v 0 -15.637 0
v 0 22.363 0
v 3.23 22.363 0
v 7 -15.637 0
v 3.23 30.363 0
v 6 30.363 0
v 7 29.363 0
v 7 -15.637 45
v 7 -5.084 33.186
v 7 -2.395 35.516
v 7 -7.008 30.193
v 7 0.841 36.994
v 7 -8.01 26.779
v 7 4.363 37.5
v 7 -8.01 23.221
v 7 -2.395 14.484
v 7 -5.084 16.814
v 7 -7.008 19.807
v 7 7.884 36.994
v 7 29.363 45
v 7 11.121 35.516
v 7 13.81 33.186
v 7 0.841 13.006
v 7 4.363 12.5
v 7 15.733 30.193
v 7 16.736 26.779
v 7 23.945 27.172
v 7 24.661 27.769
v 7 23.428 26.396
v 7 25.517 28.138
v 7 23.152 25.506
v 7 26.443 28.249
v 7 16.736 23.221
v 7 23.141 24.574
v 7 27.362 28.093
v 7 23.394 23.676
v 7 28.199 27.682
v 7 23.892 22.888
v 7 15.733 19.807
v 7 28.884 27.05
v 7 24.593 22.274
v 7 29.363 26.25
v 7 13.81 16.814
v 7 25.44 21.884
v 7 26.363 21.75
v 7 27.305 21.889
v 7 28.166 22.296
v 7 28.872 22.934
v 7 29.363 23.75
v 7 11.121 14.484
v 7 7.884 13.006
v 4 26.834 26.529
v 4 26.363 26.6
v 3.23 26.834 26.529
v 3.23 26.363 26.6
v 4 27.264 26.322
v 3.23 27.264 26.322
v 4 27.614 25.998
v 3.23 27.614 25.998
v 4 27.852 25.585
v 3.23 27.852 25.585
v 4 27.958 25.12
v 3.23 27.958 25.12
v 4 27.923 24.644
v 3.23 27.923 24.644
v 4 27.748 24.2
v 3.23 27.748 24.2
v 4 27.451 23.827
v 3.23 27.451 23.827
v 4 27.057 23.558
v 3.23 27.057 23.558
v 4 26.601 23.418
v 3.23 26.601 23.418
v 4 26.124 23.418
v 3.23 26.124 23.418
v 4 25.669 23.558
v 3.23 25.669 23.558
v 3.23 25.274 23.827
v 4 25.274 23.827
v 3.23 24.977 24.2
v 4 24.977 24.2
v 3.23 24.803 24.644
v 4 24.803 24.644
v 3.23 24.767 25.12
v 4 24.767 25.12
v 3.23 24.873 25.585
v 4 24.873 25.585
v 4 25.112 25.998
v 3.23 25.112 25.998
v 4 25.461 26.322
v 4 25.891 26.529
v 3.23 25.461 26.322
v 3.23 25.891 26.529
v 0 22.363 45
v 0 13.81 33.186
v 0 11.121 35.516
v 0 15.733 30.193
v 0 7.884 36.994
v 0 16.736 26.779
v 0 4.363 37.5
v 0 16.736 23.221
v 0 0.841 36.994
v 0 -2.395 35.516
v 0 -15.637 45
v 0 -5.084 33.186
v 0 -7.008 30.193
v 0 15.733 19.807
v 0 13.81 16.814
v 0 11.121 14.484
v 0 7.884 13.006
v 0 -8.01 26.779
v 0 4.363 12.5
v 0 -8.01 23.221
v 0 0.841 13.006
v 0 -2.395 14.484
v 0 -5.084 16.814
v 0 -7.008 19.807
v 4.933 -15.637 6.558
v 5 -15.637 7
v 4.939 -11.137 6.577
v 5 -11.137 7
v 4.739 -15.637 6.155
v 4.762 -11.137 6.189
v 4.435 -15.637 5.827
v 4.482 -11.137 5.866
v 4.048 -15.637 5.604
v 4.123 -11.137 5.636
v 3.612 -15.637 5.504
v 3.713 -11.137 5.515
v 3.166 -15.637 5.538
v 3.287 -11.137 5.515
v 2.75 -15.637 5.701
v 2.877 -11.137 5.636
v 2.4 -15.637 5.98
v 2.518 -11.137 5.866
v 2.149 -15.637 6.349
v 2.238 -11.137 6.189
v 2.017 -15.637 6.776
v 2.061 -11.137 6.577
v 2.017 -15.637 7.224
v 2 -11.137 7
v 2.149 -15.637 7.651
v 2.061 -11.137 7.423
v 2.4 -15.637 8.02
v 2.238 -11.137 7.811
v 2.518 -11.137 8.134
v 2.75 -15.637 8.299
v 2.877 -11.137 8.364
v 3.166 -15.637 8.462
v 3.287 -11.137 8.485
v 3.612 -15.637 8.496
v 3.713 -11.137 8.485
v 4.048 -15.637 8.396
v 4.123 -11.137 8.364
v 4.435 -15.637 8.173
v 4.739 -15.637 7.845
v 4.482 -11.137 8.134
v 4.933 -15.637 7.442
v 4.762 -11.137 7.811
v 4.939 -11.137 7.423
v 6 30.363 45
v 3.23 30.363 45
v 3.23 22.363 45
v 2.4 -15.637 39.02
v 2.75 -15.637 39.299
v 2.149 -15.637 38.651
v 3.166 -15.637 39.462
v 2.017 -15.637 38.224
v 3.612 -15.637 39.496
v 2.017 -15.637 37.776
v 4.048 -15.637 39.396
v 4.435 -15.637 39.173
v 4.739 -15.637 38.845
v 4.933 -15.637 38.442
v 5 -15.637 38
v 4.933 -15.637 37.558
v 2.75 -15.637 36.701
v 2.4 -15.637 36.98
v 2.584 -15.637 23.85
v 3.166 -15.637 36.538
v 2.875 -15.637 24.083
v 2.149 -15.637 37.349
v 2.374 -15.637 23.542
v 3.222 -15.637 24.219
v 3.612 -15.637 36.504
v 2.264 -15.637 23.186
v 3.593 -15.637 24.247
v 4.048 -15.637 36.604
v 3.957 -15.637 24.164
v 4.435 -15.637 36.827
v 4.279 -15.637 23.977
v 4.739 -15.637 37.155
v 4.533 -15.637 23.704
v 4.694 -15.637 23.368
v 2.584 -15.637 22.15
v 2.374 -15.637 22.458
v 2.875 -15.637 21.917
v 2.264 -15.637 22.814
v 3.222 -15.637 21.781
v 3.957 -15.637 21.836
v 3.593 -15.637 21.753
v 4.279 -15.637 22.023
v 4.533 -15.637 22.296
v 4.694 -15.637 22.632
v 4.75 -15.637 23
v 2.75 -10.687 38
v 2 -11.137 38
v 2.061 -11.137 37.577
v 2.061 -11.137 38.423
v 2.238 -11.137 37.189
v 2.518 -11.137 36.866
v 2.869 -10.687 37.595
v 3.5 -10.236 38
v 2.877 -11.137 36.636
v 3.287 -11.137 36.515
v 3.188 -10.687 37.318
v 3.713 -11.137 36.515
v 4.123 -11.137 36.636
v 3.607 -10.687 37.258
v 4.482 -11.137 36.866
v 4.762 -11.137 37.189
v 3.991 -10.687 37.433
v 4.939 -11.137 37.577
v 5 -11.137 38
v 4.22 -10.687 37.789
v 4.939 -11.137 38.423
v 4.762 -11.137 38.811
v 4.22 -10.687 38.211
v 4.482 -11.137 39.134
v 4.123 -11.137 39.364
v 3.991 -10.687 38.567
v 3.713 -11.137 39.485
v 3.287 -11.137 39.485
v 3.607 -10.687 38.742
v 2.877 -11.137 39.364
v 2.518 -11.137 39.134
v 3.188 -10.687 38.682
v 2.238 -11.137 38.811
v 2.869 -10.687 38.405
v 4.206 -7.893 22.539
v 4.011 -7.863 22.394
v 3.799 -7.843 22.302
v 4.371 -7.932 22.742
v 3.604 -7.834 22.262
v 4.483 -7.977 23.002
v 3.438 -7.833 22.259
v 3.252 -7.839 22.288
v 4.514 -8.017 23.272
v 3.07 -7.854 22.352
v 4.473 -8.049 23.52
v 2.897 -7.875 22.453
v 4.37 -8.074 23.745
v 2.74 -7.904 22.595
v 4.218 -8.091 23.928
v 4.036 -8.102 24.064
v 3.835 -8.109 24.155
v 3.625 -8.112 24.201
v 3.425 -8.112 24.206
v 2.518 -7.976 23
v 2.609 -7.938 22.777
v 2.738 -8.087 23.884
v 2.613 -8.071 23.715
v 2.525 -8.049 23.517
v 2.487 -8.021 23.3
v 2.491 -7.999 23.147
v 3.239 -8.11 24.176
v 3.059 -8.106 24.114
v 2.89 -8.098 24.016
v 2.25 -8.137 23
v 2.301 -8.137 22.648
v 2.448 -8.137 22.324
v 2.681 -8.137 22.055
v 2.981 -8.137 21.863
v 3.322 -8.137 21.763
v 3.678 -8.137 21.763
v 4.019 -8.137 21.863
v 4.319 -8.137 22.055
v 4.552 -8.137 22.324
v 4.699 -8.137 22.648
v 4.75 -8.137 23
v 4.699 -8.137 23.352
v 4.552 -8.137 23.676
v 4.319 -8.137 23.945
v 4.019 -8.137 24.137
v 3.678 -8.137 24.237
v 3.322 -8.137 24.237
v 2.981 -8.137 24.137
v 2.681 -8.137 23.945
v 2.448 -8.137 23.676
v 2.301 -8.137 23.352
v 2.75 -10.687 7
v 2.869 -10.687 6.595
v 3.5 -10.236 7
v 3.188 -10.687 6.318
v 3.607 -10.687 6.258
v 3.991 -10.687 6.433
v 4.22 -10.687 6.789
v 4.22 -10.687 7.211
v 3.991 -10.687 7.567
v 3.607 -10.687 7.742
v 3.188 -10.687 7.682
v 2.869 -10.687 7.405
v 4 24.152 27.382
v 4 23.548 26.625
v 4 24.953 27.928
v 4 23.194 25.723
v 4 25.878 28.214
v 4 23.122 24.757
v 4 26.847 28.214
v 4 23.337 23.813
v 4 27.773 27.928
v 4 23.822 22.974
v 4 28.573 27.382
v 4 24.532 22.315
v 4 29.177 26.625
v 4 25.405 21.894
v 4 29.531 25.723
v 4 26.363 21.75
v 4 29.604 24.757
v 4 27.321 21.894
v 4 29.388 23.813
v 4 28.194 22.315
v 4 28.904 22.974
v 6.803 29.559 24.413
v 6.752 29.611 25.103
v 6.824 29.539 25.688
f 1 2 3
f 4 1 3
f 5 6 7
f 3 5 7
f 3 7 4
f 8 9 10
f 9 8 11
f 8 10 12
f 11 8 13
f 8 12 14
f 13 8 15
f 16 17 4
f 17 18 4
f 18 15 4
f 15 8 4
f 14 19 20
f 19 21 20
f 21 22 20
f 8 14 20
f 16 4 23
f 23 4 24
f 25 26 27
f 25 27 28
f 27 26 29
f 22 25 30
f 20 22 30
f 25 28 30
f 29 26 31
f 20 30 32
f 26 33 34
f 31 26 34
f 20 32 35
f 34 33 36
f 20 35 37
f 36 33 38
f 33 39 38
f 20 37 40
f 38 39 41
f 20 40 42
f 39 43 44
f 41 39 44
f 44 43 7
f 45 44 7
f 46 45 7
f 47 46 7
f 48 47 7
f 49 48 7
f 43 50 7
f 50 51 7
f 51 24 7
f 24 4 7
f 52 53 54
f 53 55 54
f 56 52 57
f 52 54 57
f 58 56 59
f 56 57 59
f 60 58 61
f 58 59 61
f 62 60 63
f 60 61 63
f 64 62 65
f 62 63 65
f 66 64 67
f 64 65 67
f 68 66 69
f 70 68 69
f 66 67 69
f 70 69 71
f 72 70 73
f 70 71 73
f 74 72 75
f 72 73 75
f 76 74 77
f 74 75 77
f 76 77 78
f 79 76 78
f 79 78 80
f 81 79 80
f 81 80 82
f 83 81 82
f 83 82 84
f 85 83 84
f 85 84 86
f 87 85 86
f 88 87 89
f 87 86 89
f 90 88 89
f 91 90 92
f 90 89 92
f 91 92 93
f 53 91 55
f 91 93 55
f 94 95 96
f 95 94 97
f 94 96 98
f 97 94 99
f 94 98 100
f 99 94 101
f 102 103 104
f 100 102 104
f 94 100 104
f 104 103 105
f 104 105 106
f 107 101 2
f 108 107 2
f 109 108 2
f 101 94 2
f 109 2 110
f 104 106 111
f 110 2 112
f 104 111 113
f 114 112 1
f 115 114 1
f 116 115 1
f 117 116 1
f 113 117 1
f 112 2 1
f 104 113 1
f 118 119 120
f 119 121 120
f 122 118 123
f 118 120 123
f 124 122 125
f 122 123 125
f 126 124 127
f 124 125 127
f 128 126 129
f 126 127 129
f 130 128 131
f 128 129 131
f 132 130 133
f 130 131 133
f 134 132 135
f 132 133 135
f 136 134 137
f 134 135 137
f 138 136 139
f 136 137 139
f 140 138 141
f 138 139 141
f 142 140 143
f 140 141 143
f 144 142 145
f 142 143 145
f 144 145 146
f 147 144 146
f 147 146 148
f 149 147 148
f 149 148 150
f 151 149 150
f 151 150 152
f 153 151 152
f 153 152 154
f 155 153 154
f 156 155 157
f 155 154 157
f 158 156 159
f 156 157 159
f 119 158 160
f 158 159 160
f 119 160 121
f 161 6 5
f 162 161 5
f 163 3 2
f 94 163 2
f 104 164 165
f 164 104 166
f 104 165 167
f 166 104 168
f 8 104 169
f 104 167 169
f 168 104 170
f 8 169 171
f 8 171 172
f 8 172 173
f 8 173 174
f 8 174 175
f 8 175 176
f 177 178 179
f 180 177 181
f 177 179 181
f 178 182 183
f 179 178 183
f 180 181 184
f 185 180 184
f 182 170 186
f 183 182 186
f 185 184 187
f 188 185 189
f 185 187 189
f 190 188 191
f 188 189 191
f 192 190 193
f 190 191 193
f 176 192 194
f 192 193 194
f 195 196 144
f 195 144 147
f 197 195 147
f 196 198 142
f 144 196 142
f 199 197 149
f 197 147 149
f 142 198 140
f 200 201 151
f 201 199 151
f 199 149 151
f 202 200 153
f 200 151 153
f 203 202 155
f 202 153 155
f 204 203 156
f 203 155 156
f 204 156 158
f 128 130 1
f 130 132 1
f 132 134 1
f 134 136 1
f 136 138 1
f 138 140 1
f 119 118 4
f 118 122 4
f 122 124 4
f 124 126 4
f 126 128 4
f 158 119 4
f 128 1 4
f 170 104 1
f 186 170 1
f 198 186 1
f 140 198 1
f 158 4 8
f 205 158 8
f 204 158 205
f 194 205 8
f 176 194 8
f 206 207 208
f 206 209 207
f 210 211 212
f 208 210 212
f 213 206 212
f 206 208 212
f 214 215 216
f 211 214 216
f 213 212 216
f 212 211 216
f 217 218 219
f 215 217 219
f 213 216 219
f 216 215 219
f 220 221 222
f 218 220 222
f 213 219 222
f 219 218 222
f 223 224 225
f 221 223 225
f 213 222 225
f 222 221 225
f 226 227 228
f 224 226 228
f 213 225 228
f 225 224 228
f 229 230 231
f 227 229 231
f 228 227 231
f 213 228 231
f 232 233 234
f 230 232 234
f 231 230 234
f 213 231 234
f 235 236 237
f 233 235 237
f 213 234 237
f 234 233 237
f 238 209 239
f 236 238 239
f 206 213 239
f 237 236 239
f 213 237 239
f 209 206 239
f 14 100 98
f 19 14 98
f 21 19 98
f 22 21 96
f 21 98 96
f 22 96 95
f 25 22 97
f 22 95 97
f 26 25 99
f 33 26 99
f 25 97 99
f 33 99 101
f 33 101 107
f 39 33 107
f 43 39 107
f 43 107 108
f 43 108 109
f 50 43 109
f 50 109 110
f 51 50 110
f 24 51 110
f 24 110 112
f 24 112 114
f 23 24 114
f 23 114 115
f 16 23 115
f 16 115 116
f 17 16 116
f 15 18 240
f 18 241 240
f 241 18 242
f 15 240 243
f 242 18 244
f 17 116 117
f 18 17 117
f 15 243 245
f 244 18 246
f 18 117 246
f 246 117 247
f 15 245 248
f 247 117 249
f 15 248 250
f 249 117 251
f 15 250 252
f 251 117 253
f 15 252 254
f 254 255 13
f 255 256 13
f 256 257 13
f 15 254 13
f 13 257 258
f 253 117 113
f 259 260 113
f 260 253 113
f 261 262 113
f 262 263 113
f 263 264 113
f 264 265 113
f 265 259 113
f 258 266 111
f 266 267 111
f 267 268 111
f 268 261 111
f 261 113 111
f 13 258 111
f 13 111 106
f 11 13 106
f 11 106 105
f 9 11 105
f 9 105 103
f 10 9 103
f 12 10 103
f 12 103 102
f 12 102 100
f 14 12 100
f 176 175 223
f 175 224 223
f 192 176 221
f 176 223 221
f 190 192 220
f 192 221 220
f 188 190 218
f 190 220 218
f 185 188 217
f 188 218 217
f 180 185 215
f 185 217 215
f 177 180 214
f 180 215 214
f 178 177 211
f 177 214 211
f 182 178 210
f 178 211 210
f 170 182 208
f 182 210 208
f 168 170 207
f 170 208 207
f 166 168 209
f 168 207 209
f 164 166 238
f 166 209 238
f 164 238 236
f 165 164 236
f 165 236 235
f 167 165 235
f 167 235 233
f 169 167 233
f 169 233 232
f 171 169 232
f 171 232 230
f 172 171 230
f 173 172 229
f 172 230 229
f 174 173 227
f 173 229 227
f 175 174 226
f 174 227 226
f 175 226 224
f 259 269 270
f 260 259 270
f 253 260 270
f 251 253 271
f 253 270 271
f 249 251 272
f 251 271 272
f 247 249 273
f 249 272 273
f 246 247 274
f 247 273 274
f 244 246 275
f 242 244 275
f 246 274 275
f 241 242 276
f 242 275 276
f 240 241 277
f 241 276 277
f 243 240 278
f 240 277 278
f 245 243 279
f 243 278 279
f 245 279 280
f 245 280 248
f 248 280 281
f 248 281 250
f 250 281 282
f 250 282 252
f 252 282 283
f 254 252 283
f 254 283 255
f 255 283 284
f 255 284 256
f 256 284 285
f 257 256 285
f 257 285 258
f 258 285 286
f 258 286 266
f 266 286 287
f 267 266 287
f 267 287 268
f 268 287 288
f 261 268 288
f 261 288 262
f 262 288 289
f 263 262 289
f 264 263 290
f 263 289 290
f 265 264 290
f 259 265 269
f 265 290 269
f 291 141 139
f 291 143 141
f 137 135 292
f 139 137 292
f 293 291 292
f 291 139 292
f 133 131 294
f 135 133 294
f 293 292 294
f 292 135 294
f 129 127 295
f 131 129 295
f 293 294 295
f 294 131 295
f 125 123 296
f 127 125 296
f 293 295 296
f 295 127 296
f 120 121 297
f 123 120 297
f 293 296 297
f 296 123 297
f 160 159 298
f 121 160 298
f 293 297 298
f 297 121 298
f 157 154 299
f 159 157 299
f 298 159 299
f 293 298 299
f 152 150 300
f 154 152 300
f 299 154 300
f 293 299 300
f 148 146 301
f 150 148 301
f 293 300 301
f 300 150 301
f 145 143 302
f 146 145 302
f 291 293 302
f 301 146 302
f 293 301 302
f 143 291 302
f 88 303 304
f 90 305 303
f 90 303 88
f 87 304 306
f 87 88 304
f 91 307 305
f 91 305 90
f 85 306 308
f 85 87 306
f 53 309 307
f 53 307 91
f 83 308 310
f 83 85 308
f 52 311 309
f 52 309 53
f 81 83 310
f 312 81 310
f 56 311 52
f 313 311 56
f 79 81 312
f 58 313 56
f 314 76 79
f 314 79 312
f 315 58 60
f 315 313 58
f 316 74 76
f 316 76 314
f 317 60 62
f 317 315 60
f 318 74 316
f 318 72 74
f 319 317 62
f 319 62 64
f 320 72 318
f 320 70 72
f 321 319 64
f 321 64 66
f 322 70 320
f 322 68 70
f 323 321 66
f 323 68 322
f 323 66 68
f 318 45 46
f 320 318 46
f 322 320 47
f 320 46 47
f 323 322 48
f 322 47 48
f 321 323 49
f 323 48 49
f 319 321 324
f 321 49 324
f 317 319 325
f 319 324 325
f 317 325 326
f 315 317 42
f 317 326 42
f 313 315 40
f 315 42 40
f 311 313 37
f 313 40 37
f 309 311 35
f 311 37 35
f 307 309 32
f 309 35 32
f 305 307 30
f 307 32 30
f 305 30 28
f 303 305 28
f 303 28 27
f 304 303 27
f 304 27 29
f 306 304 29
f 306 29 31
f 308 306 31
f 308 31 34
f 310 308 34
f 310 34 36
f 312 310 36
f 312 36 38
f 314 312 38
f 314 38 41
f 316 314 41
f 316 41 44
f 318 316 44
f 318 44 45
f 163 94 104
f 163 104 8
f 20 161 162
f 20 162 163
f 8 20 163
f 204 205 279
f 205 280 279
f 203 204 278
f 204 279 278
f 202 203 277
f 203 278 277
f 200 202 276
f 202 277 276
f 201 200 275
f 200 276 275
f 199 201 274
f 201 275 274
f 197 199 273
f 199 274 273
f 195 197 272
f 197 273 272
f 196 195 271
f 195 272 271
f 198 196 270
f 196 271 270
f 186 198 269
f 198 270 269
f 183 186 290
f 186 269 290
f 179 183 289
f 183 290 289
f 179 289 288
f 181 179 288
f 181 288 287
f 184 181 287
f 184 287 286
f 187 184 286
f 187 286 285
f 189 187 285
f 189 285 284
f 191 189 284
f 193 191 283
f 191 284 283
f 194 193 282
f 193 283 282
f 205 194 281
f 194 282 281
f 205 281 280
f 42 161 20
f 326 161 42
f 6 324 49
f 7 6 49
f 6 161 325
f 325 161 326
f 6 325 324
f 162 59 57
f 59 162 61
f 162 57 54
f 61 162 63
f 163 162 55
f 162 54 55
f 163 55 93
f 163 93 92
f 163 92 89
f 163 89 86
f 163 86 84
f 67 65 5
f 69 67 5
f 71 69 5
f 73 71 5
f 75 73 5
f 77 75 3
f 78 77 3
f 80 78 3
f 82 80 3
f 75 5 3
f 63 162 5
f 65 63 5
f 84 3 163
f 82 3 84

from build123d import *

# Parameters (mm, degrees)
BOSS_EXTRUDE1_DEPTH            = 45
CBORE_FOR_M3_SHCS1_D           = 3.2
CBORE_FOR_M3_SHCS1_CBORE_D     = 6.5
CBORE_FOR_M3_SHCS1_CBORE_DEPTH = 3
F_25_0_25_DIAMETER_HOLE1_D     = 25
CHAMFER1_SIZE                  = 1
F_3_0MM_DOWEL_HOLE1_D          = 3
F_3_0MM_DOWEL_HOLE1_DEPTH      = 4.5
F_3_0MM_DOWEL_HOLE1_TIP        = 0.901290929
M3X0_5_TAPPED_HOLE1_D          = 2.5
M3X0_5_TAPPED_HOLE1_DEPTH      = 7.5
M3X0_5_TAPPED_HOLE1_TIP        = 0.751075774


with BuildPart() as part:
    # Sketch1 → Boss-Extrude1 (new body)
    with BuildSketch(Plane.XY):
        Polygon((3.23, 30.362745098), (3.23, 22.362745098), (0, 22.362745098), (0, -15.637254902), (7, -15.637254902), (7, 30.362745098), align=None)
    extrude(amount=BOSS_EXTRUDE1_DEPTH)

    # CBORE for M3 SHCS1 (through all)
    with Locations(Plane(origin=(7, 0, 0), x_dir=(0, 0, -1), z_dir=(1, 0, 0))):
        with Locations((-25, 26.362745098)):
            CounterBoreHole(CBORE_FOR_M3_SHCS1_D / 2, CBORE_FOR_M3_SHCS1_CBORE_D / 2, CBORE_FOR_M3_SHCS1_CBORE_DEPTH)

    # Ø25.0 (25) Diameter Hole1 (through all)
    with Locations(Plane(origin=(7, 0, 0), x_dir=(0, 0, -1), z_dir=(1, 0, 0))):
        with Locations((-25, 4.362745098)):
            Hole(F_25_0_25_DIAMETER_HOLE1_D / 2)

    # Chamfer1
    # the kernel refuses this chamfer: 1 mm, written as the material it takes off along each edge
    with BuildSketch(Plane(origin=(7, 30.362745098, -2.571682988), x_dir=(-0.9996219169112968, 0.027495876610585623, 0), z_dir=(0, 0, 1))) as chamfer1_piece_1:
        Polygon((CHAMFER1_SIZE * 0.999621916911, CHAMFER1_SIZE * 0.0274958766106), (-CHAMFER1_SIZE * 0.0274958766106, CHAMFER1_SIZE * 0.999621916911), (0, 0), align=None)
    extrude(amount=50.143365976, mode=Mode.SUBTRACT)

    # Ø3.0mm Dowel Hole1
    with Locations(Plane(origin=(0, -15.637254902, 0), x_dir=(-1, 0, 0), z_dir=(0, -1, 0))):
        with Locations((-3.5, -38), (-3.5, -7)):
            Hole(F_3_0MM_DOWEL_HOLE1_D / 2, depth=F_3_0MM_DOWEL_HOLE1_DEPTH)
            with Locations((0, 0, -(F_3_0MM_DOWEL_HOLE1_DEPTH + F_3_0MM_DOWEL_HOLE1_TIP / 2))):  # 118° drill point
                Cone(0, F_3_0MM_DOWEL_HOLE1_D / 2, F_3_0MM_DOWEL_HOLE1_TIP, mode=Mode.SUBTRACT)

    # M3x0.5 Tapped Hole1
    with Locations(Plane(origin=(0, -15.637254902, 0), x_dir=(-1, 0, 0), z_dir=(0, -1, 0))):
        with Locations((-3.5, -23)):
            Hole(M3X0_5_TAPPED_HOLE1_D / 2, depth=M3X0_5_TAPPED_HOLE1_DEPTH)
            with Locations((0, 0, -(M3X0_5_TAPPED_HOLE1_DEPTH + M3X0_5_TAPPED_HOLE1_TIP / 2))):  # 118° drill point
                Cone(0, M3X0_5_TAPPED_HOLE1_D / 2, M3X0_5_TAPPED_HOLE1_TIP, mode=Mode.SUBTRACT)


solid = part.part
